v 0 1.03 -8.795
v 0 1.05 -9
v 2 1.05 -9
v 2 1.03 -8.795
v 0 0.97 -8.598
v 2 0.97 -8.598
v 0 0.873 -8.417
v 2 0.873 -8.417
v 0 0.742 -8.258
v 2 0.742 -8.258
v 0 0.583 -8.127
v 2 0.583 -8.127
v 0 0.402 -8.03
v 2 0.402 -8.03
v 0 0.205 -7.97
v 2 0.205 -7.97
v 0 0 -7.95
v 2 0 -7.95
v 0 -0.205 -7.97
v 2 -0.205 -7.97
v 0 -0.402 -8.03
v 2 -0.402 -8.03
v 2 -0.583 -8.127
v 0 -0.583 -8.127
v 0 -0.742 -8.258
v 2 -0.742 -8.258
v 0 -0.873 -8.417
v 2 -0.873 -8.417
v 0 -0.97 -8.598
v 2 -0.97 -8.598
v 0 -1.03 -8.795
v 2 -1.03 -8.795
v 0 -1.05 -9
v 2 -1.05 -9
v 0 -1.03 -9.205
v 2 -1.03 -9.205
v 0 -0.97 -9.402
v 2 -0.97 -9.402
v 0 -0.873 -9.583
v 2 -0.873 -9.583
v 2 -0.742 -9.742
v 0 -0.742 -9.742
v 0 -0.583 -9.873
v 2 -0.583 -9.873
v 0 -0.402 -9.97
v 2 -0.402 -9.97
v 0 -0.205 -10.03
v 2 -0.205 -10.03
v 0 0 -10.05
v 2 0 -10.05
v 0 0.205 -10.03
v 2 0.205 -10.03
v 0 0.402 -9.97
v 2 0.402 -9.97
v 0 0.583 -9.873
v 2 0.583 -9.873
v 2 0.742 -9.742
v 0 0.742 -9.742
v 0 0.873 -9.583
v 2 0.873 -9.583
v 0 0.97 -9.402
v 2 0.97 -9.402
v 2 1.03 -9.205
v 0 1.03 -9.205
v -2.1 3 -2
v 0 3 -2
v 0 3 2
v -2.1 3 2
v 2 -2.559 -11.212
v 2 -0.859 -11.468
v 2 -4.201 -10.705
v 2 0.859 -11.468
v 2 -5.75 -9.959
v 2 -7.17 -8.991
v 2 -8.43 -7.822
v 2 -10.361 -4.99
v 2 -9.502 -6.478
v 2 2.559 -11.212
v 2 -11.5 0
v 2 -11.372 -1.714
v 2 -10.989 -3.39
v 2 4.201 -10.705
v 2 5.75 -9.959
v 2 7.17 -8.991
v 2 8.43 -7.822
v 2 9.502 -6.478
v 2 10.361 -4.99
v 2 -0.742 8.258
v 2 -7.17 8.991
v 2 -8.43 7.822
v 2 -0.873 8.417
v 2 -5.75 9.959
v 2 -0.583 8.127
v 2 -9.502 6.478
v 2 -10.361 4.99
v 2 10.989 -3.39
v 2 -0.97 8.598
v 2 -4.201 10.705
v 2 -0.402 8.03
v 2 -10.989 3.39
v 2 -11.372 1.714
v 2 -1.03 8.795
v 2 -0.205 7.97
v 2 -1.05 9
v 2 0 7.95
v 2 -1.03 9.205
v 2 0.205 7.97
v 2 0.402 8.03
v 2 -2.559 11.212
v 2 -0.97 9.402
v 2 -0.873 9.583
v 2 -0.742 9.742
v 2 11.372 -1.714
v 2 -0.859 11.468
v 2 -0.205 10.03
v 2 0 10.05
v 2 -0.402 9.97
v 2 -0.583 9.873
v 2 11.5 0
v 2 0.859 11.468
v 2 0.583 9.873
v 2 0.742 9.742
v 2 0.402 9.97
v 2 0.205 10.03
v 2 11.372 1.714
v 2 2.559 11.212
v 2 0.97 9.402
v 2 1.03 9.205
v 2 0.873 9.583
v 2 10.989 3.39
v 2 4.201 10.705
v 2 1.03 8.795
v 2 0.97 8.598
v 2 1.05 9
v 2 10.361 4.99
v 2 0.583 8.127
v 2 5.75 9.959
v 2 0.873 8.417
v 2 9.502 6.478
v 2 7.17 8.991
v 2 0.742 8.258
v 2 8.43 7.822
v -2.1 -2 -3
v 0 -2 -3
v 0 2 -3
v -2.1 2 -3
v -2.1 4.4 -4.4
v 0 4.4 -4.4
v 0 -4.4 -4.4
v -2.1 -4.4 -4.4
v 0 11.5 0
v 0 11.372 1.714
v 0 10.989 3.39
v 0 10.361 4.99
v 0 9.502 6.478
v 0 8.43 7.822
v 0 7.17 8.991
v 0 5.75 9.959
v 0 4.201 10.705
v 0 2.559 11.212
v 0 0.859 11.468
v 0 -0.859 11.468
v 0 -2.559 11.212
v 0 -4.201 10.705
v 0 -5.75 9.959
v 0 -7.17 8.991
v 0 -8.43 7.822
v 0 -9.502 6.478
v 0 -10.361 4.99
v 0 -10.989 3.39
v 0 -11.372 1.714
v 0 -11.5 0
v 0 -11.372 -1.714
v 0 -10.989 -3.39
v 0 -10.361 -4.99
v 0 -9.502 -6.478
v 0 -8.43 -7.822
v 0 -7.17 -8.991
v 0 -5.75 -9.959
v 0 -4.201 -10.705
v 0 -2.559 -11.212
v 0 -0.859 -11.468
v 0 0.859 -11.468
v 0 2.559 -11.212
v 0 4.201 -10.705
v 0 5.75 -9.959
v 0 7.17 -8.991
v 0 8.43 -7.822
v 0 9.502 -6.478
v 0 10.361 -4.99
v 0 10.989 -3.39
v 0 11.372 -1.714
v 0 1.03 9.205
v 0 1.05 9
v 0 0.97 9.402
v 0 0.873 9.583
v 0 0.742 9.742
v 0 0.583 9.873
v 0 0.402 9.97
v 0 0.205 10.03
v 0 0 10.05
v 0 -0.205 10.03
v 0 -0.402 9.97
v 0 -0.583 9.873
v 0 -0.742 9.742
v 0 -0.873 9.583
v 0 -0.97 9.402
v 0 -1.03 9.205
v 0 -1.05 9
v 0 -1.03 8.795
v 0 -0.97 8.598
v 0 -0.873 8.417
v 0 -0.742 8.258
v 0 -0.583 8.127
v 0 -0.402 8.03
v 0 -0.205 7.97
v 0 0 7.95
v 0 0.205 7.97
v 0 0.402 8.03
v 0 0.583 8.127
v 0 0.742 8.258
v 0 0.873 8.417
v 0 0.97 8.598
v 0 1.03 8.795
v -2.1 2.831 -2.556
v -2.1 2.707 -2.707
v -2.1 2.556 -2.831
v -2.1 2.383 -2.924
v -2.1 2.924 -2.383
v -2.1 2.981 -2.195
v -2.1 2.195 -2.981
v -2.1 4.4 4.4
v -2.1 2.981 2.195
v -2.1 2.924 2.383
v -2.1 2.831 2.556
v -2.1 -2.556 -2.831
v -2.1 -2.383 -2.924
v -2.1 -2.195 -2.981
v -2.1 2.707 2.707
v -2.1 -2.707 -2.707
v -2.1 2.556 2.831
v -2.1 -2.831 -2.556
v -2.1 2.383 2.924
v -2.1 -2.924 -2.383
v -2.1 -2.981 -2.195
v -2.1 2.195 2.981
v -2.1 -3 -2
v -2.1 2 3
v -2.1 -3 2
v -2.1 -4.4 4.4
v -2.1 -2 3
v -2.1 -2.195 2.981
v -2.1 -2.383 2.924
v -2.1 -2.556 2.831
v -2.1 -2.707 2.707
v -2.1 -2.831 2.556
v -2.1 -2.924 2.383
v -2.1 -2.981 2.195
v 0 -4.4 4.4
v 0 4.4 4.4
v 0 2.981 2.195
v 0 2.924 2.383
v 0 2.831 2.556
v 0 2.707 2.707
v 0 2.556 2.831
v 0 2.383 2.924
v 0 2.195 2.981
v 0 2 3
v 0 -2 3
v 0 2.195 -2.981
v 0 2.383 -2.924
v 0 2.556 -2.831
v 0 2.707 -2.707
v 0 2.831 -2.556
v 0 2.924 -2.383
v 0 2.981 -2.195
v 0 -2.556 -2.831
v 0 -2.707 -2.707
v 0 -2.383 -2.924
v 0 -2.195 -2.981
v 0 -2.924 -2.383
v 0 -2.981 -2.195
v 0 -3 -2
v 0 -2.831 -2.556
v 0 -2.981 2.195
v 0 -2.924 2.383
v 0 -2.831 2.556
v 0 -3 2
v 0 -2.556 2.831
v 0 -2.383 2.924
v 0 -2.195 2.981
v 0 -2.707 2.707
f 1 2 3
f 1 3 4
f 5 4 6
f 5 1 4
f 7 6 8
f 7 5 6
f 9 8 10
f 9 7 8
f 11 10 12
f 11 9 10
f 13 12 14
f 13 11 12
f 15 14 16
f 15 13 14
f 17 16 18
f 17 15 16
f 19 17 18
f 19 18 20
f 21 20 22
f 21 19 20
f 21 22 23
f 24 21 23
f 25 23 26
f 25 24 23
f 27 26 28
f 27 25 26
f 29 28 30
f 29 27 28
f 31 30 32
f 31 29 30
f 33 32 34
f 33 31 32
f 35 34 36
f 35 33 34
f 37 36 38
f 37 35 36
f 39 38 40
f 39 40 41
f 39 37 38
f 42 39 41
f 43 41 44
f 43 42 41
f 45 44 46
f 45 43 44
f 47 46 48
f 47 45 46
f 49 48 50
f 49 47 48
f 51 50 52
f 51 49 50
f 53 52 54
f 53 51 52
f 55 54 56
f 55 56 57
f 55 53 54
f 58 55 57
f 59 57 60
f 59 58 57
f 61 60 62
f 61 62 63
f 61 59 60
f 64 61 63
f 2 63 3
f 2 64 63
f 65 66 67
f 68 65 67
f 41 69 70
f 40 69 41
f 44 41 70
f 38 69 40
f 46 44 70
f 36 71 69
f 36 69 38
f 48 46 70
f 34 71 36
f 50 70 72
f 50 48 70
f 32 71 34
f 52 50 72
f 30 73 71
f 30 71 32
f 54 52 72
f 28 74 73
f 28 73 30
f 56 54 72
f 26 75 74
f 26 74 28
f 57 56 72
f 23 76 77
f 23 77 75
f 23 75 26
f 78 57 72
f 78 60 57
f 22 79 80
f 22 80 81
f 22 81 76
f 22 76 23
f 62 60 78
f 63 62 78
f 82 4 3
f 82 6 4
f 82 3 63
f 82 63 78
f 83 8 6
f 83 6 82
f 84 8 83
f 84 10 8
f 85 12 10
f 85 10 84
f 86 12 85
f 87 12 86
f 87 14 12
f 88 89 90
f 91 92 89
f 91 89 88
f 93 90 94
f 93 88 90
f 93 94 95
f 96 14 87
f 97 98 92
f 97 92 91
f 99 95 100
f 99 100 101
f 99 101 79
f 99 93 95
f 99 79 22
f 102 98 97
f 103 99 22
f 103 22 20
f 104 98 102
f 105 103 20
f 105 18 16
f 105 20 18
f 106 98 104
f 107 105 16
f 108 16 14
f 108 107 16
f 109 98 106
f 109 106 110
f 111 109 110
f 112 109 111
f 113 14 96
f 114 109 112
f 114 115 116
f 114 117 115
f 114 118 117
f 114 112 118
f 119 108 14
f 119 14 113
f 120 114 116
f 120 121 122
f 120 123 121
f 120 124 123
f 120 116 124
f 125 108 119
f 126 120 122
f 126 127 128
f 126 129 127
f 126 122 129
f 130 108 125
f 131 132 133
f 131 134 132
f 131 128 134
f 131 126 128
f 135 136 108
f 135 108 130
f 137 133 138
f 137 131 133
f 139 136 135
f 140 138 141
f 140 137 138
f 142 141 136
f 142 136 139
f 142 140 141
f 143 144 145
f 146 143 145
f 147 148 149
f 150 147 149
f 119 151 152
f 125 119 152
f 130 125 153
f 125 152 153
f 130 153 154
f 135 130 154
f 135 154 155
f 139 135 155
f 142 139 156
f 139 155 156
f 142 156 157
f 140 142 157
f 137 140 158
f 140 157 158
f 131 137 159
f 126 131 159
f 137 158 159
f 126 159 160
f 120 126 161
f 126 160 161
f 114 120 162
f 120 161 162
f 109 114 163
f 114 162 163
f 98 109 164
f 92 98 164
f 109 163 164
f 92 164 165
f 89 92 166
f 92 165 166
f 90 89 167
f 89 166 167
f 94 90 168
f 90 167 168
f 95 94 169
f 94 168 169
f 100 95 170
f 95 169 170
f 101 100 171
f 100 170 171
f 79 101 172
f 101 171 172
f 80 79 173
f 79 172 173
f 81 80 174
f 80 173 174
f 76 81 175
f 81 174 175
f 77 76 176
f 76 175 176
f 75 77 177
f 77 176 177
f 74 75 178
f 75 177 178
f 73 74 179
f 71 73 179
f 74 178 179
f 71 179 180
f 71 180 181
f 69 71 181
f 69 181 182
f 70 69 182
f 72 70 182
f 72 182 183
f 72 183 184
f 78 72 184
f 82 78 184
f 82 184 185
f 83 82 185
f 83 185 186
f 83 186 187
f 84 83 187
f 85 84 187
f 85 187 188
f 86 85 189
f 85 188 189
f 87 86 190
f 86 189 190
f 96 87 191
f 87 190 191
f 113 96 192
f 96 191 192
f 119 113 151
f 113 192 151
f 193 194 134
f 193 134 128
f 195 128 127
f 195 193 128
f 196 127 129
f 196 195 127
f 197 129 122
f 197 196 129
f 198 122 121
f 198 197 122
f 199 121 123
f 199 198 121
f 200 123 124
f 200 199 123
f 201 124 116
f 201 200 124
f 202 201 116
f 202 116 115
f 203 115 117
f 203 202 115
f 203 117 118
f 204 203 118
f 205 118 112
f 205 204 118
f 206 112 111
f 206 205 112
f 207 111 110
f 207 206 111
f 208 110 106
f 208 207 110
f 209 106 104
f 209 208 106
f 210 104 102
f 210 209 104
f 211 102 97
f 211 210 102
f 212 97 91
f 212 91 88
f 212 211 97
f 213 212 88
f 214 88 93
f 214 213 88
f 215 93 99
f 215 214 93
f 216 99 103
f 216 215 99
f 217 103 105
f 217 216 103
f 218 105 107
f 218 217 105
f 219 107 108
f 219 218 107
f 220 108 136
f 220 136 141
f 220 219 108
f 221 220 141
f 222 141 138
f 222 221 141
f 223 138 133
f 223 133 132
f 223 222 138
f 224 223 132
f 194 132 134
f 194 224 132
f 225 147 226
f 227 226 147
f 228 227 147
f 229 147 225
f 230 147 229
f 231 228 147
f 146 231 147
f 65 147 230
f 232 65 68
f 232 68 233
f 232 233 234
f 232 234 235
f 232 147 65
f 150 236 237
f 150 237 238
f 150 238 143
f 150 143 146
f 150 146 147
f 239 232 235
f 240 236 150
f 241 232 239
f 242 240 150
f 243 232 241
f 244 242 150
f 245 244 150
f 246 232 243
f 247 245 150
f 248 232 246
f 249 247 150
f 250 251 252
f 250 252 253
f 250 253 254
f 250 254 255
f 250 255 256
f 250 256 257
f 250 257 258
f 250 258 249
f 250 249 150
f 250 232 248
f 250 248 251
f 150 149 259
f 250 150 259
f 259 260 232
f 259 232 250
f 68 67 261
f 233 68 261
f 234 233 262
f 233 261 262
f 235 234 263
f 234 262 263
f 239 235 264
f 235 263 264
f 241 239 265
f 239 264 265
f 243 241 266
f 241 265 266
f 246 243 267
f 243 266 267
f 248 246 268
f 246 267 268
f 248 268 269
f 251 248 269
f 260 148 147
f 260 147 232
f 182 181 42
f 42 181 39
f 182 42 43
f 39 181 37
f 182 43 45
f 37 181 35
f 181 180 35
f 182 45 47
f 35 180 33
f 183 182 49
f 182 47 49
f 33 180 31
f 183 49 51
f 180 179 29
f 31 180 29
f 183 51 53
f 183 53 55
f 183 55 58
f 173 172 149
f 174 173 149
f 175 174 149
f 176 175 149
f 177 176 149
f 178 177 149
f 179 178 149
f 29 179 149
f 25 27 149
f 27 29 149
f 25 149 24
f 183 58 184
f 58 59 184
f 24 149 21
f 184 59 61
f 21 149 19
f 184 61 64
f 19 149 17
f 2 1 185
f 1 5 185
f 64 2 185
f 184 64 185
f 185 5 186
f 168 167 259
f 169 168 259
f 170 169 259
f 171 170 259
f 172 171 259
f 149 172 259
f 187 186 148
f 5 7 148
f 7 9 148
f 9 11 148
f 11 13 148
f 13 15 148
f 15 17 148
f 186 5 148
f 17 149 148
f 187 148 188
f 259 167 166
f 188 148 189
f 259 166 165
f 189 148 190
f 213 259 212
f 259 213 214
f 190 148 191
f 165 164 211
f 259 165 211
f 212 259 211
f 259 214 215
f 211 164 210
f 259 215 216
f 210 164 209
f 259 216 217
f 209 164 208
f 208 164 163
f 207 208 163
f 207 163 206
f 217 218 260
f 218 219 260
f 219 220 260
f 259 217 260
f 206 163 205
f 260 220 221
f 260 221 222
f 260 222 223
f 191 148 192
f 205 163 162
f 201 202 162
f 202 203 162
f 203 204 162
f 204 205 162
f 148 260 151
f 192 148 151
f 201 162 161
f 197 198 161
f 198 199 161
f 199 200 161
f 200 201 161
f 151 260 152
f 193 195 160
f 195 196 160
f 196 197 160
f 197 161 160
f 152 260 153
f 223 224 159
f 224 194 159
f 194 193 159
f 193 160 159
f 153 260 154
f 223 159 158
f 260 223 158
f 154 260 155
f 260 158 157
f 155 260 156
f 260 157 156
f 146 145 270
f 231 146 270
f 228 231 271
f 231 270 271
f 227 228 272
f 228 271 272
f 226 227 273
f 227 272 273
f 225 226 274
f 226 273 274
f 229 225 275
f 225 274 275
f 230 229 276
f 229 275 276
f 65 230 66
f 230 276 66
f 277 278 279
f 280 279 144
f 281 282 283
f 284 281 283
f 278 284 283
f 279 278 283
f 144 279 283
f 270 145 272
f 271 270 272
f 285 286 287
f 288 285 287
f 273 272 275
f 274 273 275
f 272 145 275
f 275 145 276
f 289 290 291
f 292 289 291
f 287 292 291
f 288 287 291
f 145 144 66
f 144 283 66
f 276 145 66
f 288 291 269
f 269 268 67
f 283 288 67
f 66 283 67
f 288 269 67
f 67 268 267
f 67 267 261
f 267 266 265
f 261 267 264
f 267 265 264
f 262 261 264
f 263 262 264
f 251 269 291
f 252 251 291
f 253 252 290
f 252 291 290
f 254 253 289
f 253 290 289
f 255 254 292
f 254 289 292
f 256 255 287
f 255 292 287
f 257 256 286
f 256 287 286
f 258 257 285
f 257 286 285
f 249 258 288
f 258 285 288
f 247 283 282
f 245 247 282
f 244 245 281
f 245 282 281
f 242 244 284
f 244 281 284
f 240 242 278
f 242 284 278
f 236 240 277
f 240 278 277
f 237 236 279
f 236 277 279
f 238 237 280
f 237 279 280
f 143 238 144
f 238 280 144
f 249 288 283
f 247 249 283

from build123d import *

# Parameters (mm, degrees)
F0_R     = 11.5
F0_R_2   = 1.05
F1_DEPTH = 2
F2_W     = 8.8
F2_H     = 8.8
F3_DEPTH = 2.1


with BuildPart() as f1:
    # F0 (on Right) → F1 (new body)
    with BuildSketch(Plane.YZ):
        Circle(F0_R)
        with Locations((0, -9)):
            Circle(F0_R_2, mode=Mode.SUBTRACT)
        with Locations((0, 9)):
            Circle(F0_R_2, mode=Mode.SUBTRACT)
    extrude(amount=F1_DEPTH)

    # F2 (on face) → F3 (join)
    with BuildSketch(Plane(origin=(0, 0, 0), x_dir=(0, -1, 0), z_dir=(-1, 0, 0))):
        Rectangle(F2_W, F2_H)
        with BuildLine():
            ThreePointArc((-3, 2), (-2.707107, 2.707107), (-2, 3))
            Line((-2, 3), (2, 3))
            ThreePointArc((2, 3), (2.707107, 2.707107), (3, 2))
            Line((3, 2), (3, -2))
            ThreePointArc((3, -2), (2.707107, -2.707107), (2, -3))
            Line((2, -3), (-2, -3))
            ThreePointArc((-2, -3), (-2.707107, -2.707107), (-3, -2))
            Line((-3, -2), (-3, 2))
        make_face(mode=Mode.SUBTRACT)
    extrude(amount=F3_DEPTH)


solid = f1.part
